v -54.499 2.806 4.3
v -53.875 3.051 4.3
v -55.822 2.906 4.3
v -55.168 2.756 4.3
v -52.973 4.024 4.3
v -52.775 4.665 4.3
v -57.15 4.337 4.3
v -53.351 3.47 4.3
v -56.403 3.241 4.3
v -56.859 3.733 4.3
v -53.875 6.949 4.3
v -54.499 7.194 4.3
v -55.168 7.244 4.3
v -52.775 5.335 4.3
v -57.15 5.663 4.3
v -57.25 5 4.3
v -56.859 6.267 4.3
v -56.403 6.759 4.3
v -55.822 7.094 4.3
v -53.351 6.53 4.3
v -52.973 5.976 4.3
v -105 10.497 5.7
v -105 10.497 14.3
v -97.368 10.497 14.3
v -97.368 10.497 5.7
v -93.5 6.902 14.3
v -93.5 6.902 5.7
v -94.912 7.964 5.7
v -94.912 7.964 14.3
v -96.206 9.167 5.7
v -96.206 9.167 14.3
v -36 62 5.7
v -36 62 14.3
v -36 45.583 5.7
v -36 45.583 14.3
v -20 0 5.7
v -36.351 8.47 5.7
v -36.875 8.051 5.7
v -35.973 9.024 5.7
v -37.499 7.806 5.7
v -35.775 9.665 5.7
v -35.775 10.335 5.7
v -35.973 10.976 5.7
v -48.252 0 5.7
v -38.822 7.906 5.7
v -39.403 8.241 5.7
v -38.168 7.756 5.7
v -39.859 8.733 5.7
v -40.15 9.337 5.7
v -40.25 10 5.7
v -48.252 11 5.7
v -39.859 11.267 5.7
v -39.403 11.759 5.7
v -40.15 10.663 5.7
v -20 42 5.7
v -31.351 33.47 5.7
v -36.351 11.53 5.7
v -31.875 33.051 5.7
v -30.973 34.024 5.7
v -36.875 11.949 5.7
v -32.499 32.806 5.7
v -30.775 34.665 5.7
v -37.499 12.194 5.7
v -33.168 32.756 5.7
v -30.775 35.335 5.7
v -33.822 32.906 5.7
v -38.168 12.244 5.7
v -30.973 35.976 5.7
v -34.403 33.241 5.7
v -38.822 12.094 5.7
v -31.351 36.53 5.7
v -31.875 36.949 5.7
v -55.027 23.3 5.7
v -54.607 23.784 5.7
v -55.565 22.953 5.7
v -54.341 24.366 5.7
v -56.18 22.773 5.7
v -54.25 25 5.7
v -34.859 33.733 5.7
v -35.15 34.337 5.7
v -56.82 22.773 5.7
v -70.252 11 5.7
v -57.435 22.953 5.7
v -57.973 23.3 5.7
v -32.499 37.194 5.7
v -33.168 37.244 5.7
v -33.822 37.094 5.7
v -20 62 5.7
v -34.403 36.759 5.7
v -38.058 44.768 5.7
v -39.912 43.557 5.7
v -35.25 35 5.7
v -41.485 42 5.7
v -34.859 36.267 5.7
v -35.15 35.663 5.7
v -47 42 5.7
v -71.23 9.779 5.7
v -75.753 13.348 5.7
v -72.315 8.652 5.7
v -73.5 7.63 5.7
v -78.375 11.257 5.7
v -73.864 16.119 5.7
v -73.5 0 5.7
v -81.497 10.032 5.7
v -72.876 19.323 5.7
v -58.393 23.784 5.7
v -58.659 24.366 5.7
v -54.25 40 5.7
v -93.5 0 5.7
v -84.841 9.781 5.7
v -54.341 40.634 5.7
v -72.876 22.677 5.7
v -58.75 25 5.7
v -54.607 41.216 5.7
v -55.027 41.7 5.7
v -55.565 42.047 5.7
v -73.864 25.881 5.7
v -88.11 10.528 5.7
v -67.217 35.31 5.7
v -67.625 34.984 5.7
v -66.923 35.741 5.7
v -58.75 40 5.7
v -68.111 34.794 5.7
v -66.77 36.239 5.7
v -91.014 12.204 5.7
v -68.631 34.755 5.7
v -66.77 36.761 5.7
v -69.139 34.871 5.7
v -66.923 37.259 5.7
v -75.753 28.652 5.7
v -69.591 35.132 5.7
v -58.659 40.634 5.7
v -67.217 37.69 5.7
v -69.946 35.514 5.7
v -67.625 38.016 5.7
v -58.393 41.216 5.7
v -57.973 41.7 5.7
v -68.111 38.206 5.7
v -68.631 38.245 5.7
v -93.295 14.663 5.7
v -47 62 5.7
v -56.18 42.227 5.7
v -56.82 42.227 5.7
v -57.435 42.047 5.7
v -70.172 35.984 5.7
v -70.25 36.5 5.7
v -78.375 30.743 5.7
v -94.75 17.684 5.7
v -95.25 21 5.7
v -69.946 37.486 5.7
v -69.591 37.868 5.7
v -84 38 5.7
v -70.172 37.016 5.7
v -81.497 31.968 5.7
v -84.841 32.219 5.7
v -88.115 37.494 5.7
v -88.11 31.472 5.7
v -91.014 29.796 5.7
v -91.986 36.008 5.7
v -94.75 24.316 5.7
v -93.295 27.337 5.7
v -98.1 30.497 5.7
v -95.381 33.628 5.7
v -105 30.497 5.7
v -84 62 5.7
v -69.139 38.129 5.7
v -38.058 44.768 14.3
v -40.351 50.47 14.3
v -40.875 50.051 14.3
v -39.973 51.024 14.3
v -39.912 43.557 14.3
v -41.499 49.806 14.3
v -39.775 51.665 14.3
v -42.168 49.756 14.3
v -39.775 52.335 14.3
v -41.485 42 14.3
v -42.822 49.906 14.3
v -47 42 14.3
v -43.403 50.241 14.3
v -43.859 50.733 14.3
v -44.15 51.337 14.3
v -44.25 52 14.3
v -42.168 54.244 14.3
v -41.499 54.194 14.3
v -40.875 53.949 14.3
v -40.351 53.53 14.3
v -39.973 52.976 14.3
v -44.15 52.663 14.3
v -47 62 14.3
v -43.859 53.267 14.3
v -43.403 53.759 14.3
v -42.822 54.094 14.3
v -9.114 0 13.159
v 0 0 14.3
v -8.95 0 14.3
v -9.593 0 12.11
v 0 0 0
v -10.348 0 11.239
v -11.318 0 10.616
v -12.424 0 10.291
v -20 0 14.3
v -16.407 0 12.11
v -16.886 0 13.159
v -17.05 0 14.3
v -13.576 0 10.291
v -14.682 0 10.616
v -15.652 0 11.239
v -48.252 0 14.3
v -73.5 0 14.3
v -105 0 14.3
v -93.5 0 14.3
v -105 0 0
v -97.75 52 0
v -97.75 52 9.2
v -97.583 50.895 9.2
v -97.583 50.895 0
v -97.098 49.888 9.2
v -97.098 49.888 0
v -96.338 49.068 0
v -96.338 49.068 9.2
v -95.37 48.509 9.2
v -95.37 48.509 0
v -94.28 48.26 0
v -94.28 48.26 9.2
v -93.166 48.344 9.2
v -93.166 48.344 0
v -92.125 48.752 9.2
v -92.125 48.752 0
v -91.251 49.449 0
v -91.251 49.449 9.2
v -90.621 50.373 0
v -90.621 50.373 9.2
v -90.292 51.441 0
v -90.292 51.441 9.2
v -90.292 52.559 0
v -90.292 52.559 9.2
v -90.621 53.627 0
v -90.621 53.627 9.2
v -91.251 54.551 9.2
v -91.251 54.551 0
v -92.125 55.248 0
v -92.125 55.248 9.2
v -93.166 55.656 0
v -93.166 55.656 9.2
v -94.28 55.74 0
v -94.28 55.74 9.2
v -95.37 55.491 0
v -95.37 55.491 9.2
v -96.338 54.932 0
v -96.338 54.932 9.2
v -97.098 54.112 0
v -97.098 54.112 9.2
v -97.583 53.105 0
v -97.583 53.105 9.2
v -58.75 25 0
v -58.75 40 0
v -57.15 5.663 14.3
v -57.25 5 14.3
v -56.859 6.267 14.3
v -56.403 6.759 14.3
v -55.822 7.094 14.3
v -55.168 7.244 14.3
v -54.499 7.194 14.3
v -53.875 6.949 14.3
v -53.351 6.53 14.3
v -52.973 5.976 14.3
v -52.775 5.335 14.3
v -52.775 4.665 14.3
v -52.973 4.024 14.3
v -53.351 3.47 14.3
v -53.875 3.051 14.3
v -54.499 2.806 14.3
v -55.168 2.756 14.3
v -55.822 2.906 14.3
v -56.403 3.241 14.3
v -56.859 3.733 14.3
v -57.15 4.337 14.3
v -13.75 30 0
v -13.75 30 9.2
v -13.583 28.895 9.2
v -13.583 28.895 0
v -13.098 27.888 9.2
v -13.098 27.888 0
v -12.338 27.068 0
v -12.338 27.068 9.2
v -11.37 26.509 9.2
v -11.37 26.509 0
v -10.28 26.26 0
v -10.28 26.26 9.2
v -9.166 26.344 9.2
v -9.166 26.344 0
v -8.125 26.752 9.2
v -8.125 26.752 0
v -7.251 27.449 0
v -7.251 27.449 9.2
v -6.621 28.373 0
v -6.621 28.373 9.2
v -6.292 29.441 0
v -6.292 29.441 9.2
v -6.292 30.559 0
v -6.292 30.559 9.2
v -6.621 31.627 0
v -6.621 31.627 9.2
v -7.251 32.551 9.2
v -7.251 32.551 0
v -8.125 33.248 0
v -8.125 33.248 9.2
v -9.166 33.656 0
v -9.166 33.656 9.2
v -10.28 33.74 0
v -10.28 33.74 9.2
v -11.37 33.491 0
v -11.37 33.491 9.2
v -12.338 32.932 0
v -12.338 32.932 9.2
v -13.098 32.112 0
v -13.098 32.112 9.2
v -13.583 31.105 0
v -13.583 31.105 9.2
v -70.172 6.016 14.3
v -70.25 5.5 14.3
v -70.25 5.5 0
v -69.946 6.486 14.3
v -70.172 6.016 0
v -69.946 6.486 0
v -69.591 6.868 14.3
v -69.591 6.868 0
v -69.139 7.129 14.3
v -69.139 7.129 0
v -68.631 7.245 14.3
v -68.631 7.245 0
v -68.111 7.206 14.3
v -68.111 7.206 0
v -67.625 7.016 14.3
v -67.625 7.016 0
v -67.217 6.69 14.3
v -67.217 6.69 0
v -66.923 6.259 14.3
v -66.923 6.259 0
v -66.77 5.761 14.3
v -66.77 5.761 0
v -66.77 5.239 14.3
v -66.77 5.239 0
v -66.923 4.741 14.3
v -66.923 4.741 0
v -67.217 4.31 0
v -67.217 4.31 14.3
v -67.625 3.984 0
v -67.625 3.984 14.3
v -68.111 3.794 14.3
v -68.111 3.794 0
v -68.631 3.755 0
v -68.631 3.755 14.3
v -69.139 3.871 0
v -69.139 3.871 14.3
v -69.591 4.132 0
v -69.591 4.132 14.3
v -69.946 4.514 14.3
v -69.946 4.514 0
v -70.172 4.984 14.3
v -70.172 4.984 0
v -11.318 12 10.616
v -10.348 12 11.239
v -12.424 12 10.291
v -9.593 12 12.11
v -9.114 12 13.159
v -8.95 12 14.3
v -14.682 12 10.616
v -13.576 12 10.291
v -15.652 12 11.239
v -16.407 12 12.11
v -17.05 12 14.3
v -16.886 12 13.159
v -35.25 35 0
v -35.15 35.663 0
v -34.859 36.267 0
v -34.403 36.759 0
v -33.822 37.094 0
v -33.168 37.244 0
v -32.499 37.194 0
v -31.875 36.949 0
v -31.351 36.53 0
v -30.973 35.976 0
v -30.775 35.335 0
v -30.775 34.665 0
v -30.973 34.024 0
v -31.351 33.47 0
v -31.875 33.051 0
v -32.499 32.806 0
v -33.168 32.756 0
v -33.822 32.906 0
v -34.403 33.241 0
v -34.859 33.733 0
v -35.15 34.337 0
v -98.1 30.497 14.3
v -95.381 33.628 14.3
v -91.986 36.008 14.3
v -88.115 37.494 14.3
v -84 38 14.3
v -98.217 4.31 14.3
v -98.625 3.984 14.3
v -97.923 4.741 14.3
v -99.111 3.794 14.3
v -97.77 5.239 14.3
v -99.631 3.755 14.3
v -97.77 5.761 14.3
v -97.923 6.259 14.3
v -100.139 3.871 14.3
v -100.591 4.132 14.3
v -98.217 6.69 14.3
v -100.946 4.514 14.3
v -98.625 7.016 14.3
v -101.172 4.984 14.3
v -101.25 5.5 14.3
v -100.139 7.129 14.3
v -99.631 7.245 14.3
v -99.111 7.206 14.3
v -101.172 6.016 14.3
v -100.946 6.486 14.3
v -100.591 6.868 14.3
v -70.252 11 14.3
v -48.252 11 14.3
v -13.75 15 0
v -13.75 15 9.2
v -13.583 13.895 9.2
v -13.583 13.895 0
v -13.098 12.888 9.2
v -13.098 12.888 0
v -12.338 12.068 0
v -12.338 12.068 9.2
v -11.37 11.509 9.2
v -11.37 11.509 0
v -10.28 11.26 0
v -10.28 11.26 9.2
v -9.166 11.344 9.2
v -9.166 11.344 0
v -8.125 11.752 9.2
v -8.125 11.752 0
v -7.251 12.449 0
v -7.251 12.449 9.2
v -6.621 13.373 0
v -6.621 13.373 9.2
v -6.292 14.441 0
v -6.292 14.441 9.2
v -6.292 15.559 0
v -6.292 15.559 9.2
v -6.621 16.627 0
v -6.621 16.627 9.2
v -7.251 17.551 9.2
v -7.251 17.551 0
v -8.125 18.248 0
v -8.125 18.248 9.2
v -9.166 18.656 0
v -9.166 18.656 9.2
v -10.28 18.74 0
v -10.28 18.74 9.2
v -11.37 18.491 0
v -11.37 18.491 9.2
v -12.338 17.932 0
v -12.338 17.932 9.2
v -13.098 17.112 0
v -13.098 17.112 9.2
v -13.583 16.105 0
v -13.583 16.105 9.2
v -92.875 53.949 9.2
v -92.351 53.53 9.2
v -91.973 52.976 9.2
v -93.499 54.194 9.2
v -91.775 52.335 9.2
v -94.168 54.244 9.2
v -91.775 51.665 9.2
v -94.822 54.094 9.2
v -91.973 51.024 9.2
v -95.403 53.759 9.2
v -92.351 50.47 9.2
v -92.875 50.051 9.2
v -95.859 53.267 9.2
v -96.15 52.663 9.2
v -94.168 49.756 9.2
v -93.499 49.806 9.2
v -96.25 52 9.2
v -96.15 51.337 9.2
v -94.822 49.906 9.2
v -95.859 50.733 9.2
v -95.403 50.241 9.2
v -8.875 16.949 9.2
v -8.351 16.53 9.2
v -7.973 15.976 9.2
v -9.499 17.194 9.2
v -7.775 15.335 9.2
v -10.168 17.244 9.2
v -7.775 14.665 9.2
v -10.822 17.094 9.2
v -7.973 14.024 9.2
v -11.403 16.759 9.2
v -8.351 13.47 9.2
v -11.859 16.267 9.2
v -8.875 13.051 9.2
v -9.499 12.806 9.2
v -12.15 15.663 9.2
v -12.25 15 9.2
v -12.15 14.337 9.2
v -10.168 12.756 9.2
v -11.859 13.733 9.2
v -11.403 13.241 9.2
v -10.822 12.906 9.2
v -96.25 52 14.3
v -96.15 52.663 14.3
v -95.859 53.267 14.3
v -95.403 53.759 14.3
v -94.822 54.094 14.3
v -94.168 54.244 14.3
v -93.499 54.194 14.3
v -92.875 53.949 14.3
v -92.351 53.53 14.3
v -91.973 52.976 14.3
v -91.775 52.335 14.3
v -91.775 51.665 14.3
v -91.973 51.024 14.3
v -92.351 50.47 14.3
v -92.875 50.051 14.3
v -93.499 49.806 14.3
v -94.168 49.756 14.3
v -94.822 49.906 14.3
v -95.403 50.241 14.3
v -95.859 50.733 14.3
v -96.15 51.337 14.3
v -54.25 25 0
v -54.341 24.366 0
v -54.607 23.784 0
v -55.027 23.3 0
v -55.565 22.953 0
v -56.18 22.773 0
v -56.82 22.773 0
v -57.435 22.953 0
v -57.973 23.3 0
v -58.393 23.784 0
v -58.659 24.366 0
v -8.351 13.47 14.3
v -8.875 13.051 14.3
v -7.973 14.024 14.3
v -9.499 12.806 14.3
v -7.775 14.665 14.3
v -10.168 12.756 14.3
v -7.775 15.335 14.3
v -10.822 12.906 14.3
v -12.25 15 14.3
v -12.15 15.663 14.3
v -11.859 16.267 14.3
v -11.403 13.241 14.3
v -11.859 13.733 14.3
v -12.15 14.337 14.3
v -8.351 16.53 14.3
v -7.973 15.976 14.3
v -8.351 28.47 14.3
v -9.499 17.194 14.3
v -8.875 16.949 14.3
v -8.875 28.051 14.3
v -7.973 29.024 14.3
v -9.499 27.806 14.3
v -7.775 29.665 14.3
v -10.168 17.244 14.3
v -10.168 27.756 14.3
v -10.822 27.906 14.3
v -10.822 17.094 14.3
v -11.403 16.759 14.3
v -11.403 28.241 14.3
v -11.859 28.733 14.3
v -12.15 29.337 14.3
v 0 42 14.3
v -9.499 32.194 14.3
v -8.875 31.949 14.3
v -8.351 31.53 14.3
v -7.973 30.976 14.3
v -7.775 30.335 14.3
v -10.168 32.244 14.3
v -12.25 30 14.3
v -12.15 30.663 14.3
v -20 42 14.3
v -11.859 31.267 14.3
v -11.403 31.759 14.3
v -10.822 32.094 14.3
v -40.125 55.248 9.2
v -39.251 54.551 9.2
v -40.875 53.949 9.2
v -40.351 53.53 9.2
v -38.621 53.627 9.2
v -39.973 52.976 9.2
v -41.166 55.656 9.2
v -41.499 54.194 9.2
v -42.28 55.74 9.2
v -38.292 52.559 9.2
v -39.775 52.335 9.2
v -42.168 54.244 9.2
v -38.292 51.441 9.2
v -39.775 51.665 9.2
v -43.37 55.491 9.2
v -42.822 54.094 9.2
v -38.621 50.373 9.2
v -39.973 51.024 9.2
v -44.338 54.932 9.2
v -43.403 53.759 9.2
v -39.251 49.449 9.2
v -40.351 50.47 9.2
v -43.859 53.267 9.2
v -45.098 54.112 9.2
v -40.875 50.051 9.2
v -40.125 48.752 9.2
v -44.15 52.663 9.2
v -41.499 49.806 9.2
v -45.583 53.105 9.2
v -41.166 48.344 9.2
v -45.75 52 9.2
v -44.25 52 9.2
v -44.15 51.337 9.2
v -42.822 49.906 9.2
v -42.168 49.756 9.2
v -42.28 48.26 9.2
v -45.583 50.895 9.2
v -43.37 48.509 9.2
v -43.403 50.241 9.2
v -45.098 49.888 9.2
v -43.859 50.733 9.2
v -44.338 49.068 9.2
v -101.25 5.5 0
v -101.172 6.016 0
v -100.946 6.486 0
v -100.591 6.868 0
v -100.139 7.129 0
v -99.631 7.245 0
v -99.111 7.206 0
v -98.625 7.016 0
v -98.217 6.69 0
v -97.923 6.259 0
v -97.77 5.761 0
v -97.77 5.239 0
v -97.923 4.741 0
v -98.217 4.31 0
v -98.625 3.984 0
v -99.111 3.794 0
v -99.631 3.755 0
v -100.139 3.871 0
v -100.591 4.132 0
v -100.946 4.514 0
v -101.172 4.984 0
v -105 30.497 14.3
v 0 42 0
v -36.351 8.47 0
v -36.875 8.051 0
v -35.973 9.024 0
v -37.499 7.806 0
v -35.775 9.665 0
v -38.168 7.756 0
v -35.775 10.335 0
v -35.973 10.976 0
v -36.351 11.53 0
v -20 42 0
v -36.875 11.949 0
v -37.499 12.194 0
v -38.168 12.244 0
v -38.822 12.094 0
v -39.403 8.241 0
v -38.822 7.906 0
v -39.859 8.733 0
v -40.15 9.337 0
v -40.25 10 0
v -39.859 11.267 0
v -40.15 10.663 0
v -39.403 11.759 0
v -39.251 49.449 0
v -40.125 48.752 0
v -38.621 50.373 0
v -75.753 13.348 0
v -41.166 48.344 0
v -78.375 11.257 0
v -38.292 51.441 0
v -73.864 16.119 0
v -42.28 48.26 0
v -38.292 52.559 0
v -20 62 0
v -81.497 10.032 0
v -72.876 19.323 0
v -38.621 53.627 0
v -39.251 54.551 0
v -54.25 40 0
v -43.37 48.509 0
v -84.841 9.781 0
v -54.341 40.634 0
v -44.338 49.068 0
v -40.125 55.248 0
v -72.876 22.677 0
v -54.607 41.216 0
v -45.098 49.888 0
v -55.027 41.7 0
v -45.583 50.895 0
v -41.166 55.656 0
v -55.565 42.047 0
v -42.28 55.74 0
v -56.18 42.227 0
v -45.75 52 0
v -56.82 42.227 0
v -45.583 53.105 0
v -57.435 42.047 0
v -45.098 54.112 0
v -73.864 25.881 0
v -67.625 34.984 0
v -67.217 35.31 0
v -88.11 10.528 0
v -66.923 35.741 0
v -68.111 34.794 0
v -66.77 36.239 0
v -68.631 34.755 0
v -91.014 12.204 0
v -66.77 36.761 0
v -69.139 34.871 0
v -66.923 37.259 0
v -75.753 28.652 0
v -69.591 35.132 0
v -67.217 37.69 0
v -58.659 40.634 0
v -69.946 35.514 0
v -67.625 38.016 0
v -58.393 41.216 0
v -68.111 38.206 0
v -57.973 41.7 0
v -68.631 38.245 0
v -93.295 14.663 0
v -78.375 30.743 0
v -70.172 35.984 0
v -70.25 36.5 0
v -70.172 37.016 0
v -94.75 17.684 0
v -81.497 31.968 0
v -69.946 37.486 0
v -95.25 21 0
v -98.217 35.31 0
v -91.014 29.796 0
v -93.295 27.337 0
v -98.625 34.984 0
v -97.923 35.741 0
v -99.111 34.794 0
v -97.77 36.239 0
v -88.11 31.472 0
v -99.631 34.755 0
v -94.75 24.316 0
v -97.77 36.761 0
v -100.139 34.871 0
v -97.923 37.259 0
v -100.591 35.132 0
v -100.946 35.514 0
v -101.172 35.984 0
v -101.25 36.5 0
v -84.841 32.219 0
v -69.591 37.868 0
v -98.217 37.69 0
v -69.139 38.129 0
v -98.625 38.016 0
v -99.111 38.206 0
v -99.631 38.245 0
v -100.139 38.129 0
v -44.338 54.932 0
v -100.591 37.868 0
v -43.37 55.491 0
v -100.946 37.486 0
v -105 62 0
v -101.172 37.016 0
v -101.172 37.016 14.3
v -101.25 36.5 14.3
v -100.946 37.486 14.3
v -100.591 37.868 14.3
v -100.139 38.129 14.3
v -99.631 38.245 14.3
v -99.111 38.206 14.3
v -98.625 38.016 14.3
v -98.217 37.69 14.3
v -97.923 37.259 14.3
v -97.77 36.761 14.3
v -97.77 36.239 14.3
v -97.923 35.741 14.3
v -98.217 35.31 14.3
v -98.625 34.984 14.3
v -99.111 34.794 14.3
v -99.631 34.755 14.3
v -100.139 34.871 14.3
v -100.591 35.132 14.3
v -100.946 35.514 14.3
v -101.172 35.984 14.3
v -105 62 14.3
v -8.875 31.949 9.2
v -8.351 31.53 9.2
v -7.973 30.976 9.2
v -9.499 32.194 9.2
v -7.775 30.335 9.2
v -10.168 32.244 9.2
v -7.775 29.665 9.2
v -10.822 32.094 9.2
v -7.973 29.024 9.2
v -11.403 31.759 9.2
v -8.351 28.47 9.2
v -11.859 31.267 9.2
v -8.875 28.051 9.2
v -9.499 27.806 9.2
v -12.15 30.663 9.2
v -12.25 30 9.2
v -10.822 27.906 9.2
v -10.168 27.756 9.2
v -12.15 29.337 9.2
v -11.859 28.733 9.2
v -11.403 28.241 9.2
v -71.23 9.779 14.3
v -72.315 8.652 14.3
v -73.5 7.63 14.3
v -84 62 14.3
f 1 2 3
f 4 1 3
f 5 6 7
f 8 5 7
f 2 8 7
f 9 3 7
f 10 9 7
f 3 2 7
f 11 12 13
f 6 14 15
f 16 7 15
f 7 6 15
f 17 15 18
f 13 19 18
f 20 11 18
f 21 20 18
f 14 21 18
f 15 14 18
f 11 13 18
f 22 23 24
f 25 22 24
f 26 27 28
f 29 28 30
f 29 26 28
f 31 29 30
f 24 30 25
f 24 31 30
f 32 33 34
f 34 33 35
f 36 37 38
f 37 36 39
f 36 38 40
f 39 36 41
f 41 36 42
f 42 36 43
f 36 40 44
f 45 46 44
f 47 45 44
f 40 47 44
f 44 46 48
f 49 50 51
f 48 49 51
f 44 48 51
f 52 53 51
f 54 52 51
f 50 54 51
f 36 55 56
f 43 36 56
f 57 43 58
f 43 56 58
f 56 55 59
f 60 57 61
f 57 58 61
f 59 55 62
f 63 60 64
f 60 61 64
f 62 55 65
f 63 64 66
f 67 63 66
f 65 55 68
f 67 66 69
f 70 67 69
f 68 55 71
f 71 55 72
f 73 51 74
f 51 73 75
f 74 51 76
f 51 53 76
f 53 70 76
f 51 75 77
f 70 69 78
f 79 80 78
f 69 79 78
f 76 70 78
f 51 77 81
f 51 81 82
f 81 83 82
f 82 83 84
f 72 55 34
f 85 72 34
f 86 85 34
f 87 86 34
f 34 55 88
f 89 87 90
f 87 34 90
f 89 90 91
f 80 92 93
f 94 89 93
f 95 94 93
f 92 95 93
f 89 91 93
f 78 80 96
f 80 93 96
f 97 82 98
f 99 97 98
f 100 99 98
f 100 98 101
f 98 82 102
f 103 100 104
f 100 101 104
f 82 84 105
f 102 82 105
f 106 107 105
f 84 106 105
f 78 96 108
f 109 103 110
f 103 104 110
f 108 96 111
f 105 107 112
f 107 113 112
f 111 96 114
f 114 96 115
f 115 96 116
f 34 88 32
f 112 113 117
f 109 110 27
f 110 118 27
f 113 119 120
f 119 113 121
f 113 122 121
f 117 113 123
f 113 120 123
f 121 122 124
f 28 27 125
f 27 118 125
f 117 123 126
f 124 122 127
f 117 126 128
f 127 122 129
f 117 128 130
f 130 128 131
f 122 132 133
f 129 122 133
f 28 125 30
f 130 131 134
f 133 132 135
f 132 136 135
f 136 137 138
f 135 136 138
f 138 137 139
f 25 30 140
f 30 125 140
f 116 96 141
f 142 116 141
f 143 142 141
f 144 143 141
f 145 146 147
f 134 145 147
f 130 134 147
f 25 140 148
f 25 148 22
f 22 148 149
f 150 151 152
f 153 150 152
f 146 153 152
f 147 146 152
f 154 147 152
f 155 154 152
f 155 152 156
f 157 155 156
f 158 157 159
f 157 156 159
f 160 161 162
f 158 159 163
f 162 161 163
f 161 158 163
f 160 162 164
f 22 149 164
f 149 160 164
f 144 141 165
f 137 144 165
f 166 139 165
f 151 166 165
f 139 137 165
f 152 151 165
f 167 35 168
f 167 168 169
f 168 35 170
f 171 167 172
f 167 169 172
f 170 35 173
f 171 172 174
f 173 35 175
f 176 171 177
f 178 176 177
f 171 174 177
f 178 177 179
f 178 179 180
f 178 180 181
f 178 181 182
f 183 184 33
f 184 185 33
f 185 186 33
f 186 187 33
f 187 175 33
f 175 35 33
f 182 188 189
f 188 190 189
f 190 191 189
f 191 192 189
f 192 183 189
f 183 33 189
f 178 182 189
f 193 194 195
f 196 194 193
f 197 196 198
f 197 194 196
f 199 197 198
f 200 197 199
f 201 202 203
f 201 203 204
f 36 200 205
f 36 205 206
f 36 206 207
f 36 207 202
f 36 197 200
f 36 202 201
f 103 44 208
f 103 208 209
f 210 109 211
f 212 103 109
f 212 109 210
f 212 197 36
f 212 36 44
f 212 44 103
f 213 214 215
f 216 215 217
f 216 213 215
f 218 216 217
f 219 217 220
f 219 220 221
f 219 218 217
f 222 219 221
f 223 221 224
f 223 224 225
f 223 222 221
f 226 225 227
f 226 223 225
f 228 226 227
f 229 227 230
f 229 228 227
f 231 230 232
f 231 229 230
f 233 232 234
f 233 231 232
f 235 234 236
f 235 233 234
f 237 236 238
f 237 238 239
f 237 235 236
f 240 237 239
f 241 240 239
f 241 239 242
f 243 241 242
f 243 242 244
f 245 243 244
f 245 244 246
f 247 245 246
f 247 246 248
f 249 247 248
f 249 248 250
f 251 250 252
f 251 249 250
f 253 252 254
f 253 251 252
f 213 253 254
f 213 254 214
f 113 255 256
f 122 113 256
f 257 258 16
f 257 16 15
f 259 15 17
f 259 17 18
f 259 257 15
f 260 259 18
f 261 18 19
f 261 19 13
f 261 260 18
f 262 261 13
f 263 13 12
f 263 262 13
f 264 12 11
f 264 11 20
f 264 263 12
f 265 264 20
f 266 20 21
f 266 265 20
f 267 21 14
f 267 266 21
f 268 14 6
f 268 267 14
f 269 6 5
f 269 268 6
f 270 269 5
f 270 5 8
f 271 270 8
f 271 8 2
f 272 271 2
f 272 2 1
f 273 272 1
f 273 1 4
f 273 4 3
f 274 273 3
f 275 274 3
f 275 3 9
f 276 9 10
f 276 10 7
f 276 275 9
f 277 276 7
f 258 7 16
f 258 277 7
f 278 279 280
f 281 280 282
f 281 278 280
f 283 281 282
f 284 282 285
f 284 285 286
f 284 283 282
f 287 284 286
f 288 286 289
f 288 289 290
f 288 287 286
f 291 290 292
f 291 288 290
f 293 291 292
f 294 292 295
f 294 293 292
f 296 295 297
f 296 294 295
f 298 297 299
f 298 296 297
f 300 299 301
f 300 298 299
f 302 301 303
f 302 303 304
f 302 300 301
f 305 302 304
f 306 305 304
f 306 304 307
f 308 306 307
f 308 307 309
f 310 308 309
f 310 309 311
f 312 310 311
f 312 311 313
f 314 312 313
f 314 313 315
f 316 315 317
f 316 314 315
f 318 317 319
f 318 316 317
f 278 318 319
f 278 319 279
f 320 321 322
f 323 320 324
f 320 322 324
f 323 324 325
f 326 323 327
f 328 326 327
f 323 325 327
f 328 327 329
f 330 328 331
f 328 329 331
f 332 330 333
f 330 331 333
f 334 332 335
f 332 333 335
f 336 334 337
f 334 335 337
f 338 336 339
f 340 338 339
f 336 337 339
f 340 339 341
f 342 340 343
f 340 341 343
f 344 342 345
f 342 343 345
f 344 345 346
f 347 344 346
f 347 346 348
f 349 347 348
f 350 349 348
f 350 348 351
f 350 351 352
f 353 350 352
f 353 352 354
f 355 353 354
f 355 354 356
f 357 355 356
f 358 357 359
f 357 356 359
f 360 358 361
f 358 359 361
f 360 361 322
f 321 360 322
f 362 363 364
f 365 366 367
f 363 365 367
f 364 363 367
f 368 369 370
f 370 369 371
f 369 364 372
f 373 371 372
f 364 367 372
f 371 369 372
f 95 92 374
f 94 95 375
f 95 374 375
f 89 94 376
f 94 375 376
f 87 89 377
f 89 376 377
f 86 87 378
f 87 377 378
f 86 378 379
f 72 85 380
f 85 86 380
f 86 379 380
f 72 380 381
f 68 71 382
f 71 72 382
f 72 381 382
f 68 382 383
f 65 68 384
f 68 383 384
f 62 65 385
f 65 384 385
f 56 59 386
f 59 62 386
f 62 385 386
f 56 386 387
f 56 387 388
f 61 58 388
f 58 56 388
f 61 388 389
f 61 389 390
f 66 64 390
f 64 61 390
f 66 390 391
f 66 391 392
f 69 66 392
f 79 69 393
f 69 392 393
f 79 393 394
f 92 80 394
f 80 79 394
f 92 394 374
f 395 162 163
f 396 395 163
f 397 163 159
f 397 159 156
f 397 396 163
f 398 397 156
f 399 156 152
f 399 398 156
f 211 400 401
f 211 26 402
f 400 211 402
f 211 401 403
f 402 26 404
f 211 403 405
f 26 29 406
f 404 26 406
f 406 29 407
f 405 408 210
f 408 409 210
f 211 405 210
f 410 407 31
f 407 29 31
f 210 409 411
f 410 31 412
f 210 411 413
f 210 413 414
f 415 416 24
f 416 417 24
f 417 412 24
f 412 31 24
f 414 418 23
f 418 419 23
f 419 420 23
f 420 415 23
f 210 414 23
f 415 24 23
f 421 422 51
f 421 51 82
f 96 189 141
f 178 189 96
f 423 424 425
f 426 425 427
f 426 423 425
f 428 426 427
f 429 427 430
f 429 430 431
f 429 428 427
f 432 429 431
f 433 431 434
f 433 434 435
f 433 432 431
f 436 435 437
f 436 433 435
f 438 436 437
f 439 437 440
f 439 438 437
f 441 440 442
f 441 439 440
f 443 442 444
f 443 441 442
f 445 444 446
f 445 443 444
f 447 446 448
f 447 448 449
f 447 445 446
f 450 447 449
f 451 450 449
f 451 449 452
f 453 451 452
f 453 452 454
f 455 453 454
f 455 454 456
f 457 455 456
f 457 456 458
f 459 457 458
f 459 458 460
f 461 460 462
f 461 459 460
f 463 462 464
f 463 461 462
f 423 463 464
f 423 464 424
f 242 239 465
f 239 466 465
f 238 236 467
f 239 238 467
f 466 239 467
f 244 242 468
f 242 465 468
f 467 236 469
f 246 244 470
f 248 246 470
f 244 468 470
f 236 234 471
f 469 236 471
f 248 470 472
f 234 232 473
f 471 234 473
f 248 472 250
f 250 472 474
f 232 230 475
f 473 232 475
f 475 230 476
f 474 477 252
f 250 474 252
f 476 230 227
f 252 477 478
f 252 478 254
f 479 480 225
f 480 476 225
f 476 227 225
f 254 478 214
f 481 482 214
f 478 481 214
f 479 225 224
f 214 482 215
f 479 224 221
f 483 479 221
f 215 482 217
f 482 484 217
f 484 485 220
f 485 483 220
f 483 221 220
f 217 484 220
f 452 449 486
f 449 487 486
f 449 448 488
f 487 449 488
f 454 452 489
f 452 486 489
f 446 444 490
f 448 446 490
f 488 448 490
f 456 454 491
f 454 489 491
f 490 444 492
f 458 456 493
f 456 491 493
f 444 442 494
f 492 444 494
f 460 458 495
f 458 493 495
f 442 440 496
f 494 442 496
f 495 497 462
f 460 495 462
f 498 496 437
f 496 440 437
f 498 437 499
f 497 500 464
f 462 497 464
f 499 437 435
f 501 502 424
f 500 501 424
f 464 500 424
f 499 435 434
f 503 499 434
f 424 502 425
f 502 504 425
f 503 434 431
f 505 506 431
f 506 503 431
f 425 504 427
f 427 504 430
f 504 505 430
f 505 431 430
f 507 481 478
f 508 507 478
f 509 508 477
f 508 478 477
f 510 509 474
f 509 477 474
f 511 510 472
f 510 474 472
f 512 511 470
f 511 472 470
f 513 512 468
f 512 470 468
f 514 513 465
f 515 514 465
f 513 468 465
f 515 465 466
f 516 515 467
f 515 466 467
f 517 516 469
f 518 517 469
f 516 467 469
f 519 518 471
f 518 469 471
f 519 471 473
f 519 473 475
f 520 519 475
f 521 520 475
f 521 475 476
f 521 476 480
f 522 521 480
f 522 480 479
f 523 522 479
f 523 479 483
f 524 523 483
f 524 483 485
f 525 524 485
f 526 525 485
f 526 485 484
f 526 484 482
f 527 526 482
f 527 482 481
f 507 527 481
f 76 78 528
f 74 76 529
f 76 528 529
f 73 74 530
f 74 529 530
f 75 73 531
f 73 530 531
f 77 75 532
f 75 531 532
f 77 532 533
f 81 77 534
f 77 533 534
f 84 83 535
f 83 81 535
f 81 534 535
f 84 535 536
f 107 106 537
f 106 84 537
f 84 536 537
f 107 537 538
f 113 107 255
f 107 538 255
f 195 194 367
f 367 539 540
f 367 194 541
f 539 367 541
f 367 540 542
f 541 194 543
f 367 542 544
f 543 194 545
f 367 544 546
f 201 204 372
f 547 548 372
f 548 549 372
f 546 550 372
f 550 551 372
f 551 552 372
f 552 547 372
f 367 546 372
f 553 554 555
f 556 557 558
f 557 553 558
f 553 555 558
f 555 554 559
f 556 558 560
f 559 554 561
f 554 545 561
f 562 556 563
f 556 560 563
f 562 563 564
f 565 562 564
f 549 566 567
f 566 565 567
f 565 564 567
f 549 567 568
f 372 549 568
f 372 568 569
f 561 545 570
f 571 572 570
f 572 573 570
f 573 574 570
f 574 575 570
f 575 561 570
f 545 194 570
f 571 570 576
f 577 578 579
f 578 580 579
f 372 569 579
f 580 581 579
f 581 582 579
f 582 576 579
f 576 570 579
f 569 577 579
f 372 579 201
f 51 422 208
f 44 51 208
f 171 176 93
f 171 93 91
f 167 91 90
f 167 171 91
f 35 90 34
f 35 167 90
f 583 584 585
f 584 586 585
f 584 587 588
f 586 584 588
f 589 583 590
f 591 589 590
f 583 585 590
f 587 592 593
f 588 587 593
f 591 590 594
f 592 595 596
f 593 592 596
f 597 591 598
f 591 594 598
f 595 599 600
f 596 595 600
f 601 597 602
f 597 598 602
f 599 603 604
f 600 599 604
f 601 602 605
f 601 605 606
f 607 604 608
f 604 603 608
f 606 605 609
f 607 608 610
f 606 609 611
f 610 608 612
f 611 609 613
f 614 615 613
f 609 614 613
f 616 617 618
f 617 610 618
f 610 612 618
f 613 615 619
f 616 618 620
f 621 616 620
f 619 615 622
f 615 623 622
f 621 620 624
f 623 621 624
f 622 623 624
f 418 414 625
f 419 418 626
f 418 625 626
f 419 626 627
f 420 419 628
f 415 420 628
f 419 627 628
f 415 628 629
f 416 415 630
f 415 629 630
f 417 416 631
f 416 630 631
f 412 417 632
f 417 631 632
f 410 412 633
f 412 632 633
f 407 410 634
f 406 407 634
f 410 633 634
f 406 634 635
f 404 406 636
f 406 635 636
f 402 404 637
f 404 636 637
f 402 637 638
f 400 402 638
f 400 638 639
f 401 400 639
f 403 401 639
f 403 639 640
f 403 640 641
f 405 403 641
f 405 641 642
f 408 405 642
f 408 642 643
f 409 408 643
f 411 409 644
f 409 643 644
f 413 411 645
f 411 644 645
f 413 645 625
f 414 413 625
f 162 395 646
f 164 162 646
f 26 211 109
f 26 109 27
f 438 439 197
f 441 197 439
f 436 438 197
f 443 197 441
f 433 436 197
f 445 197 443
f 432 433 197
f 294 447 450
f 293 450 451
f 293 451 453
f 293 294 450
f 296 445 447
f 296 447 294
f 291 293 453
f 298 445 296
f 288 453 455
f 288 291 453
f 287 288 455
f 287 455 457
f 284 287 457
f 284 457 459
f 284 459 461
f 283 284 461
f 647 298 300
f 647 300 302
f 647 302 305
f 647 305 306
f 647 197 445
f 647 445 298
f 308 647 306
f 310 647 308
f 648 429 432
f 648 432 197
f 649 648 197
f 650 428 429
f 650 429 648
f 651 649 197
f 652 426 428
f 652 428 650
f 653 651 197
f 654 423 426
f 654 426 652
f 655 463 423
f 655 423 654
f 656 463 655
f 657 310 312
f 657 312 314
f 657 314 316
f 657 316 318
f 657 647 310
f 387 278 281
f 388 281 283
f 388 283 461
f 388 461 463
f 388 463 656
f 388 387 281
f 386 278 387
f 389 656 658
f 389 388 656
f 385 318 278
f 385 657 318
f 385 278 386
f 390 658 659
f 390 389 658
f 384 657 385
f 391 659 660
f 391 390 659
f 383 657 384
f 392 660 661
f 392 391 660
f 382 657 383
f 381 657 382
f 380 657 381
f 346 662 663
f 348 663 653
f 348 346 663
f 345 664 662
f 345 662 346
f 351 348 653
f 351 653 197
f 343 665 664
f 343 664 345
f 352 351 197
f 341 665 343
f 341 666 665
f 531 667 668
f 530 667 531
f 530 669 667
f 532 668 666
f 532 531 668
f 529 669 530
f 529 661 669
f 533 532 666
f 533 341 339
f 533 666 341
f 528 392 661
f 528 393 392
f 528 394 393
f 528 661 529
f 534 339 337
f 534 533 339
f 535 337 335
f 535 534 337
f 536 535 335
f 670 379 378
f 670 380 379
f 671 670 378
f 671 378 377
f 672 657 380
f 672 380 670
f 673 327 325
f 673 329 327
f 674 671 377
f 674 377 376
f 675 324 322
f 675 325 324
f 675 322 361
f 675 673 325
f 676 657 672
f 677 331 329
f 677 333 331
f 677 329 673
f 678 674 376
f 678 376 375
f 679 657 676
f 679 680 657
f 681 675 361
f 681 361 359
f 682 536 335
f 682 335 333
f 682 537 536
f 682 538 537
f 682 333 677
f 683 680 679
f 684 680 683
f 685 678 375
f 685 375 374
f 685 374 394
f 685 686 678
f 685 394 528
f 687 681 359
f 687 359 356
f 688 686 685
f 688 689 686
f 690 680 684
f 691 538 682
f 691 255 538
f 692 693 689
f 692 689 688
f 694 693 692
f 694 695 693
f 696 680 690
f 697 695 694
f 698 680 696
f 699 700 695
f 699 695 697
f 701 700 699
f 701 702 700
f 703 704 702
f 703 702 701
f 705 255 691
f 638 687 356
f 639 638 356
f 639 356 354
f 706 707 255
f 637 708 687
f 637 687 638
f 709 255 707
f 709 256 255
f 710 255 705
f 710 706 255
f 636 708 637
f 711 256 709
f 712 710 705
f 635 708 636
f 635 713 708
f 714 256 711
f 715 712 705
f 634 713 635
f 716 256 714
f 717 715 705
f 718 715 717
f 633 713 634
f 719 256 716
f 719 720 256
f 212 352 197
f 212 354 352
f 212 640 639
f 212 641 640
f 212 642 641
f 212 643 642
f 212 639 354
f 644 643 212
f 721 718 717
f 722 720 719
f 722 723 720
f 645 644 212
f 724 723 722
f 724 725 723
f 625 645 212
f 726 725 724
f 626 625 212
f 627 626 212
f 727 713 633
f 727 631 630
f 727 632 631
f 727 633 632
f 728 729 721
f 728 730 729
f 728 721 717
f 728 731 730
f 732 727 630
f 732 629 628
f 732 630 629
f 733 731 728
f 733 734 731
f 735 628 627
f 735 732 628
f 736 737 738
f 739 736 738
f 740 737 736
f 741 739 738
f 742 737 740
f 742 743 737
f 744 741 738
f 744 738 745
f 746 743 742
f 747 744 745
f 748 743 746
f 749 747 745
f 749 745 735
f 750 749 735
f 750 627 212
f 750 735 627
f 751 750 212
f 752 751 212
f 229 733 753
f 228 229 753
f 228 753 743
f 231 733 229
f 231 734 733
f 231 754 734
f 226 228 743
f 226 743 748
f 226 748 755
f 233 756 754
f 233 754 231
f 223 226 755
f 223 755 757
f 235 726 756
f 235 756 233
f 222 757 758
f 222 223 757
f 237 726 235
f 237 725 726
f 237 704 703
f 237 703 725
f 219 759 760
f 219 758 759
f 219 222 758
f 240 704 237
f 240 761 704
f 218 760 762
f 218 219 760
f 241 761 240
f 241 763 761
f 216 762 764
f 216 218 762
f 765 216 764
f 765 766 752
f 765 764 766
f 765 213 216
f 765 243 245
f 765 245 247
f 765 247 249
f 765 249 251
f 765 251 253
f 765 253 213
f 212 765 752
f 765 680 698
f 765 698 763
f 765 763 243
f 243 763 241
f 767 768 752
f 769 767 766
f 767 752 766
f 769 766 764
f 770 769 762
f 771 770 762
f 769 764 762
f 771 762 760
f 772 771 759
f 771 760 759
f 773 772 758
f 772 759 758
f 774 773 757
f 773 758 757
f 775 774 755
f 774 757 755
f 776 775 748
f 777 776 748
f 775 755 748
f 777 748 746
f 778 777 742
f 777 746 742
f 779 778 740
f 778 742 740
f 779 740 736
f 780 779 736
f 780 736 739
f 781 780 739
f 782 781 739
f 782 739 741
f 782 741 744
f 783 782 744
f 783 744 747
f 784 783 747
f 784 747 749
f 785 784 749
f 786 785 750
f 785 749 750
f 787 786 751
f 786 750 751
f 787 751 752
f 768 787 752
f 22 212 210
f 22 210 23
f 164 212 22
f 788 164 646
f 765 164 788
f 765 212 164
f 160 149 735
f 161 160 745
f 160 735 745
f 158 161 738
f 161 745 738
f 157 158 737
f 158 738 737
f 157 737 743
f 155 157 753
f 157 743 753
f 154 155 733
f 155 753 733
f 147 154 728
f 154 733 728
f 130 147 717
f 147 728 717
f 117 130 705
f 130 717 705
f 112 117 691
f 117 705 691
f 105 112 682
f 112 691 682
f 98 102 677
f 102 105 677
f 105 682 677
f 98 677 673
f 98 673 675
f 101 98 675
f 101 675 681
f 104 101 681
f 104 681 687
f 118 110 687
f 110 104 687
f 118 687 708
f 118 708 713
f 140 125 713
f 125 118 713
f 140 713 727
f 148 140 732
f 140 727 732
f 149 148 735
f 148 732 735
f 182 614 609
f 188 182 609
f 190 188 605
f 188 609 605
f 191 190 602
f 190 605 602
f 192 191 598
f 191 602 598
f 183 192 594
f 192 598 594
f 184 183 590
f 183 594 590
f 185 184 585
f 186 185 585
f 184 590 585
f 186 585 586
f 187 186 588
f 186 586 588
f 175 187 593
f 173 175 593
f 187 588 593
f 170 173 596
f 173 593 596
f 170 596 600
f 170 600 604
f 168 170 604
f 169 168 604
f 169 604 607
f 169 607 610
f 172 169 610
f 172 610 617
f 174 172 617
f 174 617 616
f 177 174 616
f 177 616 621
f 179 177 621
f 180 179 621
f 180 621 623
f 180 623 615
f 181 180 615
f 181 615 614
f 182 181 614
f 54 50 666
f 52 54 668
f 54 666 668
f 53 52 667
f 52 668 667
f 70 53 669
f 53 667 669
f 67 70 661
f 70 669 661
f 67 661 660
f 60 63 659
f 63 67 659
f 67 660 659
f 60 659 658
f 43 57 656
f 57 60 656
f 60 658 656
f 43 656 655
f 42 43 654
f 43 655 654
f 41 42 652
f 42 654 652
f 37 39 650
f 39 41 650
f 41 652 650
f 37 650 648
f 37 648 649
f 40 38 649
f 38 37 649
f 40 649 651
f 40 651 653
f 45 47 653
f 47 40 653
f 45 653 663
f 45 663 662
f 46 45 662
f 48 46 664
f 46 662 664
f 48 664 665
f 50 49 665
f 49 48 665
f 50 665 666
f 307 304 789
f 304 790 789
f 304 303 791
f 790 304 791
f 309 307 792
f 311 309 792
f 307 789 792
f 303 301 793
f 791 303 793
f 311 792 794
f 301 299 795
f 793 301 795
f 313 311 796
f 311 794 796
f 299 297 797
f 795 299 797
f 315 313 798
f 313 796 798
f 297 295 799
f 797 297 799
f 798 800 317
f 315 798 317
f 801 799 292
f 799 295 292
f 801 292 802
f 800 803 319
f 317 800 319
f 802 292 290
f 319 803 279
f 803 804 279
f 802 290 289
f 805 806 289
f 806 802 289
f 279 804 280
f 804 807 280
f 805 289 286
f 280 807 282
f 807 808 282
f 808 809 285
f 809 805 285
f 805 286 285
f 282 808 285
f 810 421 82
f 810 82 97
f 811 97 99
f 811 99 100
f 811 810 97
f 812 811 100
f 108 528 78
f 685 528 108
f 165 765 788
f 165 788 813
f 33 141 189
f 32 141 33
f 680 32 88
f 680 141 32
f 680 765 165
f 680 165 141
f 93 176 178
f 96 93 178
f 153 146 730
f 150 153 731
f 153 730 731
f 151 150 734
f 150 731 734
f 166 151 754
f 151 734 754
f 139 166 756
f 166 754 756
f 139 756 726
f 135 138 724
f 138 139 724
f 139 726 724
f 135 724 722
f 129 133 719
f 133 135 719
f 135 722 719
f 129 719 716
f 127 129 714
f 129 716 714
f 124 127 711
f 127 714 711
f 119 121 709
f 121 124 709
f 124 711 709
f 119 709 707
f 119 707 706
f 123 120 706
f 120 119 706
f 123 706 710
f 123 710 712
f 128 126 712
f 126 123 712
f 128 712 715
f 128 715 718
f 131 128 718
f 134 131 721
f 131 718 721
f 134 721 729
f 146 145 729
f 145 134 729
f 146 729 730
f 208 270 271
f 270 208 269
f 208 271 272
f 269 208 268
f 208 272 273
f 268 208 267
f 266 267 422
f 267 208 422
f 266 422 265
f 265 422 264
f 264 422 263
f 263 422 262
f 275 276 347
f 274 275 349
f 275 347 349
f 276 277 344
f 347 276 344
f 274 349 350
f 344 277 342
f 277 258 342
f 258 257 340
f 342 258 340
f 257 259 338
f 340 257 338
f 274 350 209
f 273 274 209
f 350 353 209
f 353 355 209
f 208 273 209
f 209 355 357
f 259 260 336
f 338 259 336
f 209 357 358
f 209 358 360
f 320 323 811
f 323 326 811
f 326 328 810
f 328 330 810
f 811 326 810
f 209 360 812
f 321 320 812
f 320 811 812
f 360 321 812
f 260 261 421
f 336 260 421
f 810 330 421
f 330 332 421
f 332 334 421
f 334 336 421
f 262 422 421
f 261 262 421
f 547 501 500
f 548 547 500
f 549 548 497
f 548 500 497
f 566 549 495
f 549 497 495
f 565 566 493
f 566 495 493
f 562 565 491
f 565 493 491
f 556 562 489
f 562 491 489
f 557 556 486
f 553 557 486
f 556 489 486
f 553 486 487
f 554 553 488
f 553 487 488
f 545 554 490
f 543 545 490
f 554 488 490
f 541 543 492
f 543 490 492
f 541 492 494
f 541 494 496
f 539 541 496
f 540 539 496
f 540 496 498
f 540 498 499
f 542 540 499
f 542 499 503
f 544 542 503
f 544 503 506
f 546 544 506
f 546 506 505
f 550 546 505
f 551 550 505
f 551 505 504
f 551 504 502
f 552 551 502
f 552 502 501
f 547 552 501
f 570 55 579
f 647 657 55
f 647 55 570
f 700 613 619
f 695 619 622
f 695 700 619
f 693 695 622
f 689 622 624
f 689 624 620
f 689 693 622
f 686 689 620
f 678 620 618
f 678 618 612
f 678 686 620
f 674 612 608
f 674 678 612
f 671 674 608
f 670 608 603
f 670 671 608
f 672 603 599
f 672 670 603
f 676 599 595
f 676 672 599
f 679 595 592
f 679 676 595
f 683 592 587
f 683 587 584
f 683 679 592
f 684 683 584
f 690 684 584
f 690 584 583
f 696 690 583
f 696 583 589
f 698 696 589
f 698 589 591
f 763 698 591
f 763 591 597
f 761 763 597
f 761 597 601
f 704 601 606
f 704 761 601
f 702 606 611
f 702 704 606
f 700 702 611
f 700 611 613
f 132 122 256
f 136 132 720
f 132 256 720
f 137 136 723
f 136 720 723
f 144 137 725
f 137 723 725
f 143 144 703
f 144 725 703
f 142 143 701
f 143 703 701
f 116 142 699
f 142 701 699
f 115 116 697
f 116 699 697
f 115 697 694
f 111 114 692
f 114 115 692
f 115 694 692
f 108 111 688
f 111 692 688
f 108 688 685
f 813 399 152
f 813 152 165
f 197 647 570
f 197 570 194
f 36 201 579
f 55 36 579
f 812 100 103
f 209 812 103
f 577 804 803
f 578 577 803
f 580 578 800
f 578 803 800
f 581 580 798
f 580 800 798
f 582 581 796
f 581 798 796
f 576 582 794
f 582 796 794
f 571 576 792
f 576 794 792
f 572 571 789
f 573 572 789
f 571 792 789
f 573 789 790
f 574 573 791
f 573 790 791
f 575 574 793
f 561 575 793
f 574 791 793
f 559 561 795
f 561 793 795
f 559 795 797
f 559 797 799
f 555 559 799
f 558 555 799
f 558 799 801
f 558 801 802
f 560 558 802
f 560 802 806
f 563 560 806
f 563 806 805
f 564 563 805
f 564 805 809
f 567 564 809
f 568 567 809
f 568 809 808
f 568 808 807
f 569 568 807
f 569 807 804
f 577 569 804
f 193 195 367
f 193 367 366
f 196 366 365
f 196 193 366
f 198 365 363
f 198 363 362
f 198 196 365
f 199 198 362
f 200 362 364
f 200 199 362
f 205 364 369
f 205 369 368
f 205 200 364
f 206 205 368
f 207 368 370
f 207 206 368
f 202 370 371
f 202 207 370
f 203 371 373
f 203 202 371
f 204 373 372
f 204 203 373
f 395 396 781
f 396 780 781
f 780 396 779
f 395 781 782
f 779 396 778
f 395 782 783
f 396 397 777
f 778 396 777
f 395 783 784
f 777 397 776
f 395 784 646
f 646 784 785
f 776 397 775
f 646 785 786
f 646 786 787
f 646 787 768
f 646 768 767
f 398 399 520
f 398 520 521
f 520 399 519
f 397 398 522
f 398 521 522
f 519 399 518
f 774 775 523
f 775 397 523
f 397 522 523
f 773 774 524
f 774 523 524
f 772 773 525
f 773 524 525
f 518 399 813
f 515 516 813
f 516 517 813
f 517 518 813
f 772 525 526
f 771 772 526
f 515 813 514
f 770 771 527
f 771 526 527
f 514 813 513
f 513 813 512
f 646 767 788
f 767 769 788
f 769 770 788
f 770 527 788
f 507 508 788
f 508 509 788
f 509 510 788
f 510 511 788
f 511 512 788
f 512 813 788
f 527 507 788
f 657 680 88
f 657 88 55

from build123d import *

# Parameters (mm, degrees)
SKETCH_R        = 2.25
SKETCH_R_2      = 11.25
SKETCH_R_3      = 1.75
PAD_DEPTH       = 14.3
POCKET_DEPTH    = 8.6
SKETCH004_R     = 2.25
POCKET003_DEPTH = 10
SKETCH005_R     = 4.05
POCKET004_DEPTH = 12
SKETCH006_R     = 3.75
POCKET005_DEPTH = 9.2


with BuildPart() as pocket005:
    # Sketch → Pad (new body)
    with BuildSketch(Plane.XY):
        Polygon((0, 0), (105, 0), (105, 62), (20, 62), (20, 42), (0, 42), align=None)
        with Locations((38, 10)):
            Circle(SKETCH_R, mode=Mode.SUBTRACT)
        with Locations((33, 35)):
            Circle(SKETCH_R, mode=Mode.SUBTRACT)
        with Locations((84, 21)):
            Circle(SKETCH_R_2, mode=Mode.SUBTRACT)
        with Locations((68.5, 36.5)):
            Circle(SKETCH_R_3, mode=Mode.SUBTRACT)
        with Locations((99.5, 36.5)):
            Circle(SKETCH_R_3, mode=Mode.SUBTRACT)
        with Locations((68.5, 5.5)):
            Circle(SKETCH_R_3, mode=Mode.SUBTRACT)
        with Locations((99.5, 5.5)):
            Circle(SKETCH_R_3, mode=Mode.SUBTRACT)
        with Locations((10, 30)):
            Circle(SKETCH_R, mode=Mode.SUBTRACT)
        with Locations((10, 15)):
            Circle(SKETCH_R, mode=Mode.SUBTRACT)
        with Locations((42, 52)):
            Circle(SKETCH_R, mode=Mode.SUBTRACT)
        with Locations((94, 52)):
            Circle(SKETCH_R, mode=Mode.SUBTRACT)
        with BuildLine():
            Line((58.75, 25), (58.75, 39.999999))
            ThreePointArc((58.75, 39.999999), (56.5, 42.25), (54.25, 39.999998))
            Line((54.25, 25.000001), (54.25, 39.999998))
            ThreePointArc((54.25, 25.000001), (56.5, 22.75), (58.75, 25))
        make_face(mode=Mode.SUBTRACT)
    extrude(amount=PAD_DEPTH)

    # Sketch001 → Pocket (cut)
    with BuildSketch(Plane.XY.offset(14.3)):
        with BuildLine():
            ThreePointArc((41.485277, 42), (39.015593, 44.209375), (35.999996, 45.583005))
            Line((35.999996, 67), (35.999996, 45.583005))
            Line((20, 67), (35.999996, 67))
            Line((20, -1), (20, 67))
            Line((20, -1), (48.252269, -1))
            Line((48.252269, 11), (48.252269, -1))
            Line((48.252269, 11), (70.252269, 11))
            ThreePointArc((70.252269, 11), (71.759618, 9.202833), (73.499996, 7.630258))
            Line((73.499996, 7.630258), (73.499996, -1))
            Line((73.499996, -1), (93.499996, -1))
            Line((93.499996, -1), (93.499996, 6.902128))
            ThreePointArc((93.499996, 6.902128), (95.574295, 8.548671), (97.367695, 10.497399))
            Line((105.499996, 10.497399), (97.367695, 10.497399))
            Line((105.499996, 30.497399), (105.499996, 10.497399))
            Line((98.099621, 30.497399), (105.499996, 30.497399))
            ThreePointArc((98.099621, 30.497399), (91.98574, 36.007594), (83.999996, 38))
            Line((83.999996, 38), (83.999996, 67))
            Line((83.999996, 67), (46.999996, 67))
            Line((46.999996, 67), (46.999996, 42))
            Line((41.485277, 42), (46.999996, 42))
        make_face()
    extrude(amount=-POCKET_DEPTH, mode=Mode.SUBTRACT)

    # Sketch004 → Pocket003 (cut)
    with BuildSketch(Plane.XY.offset(14.3)):
        with Locations((55, 5)):
            Circle(SKETCH004_R)
    extrude(amount=-POCKET003_DEPTH, mode=Mode.SUBTRACT)

    # Sketch005 → Pocket004 (cut)
    with BuildSketch(Plane.XZ):
        with Locations((13, 14.3)):
            Circle(SKETCH005_R)
    extrude(amount=-POCKET004_DEPTH, mode=Mode.SUBTRACT)

    # Sketch006 → Pocket005 (cut)
    with BuildSketch(Plane(origin=(0, 0, 0), x_dir=(1, 0, 0), z_dir=(0, 0, -1))):
        with Locations((10, -15)):
            Circle(SKETCH006_R)
        with Locations((10, -30)):
            Circle(SKETCH006_R)
        with Locations((42, -52)):
            Circle(SKETCH006_R)
        with Locations((94, -52)):
            Circle(SKETCH006_R)
    extrude(amount=-POCKET005_DEPTH, mode=Mode.SUBTRACT)


with BuildPart() as part_mirroring:
    # Part__Mirroring: instance of Pocket005
    add(pocket005.part.mirror(Plane(origin=(0, 0, 0), x_dir=(0, -1, 0), z_dir=(1, 0, 0))))


solid = part_mirroring.part
